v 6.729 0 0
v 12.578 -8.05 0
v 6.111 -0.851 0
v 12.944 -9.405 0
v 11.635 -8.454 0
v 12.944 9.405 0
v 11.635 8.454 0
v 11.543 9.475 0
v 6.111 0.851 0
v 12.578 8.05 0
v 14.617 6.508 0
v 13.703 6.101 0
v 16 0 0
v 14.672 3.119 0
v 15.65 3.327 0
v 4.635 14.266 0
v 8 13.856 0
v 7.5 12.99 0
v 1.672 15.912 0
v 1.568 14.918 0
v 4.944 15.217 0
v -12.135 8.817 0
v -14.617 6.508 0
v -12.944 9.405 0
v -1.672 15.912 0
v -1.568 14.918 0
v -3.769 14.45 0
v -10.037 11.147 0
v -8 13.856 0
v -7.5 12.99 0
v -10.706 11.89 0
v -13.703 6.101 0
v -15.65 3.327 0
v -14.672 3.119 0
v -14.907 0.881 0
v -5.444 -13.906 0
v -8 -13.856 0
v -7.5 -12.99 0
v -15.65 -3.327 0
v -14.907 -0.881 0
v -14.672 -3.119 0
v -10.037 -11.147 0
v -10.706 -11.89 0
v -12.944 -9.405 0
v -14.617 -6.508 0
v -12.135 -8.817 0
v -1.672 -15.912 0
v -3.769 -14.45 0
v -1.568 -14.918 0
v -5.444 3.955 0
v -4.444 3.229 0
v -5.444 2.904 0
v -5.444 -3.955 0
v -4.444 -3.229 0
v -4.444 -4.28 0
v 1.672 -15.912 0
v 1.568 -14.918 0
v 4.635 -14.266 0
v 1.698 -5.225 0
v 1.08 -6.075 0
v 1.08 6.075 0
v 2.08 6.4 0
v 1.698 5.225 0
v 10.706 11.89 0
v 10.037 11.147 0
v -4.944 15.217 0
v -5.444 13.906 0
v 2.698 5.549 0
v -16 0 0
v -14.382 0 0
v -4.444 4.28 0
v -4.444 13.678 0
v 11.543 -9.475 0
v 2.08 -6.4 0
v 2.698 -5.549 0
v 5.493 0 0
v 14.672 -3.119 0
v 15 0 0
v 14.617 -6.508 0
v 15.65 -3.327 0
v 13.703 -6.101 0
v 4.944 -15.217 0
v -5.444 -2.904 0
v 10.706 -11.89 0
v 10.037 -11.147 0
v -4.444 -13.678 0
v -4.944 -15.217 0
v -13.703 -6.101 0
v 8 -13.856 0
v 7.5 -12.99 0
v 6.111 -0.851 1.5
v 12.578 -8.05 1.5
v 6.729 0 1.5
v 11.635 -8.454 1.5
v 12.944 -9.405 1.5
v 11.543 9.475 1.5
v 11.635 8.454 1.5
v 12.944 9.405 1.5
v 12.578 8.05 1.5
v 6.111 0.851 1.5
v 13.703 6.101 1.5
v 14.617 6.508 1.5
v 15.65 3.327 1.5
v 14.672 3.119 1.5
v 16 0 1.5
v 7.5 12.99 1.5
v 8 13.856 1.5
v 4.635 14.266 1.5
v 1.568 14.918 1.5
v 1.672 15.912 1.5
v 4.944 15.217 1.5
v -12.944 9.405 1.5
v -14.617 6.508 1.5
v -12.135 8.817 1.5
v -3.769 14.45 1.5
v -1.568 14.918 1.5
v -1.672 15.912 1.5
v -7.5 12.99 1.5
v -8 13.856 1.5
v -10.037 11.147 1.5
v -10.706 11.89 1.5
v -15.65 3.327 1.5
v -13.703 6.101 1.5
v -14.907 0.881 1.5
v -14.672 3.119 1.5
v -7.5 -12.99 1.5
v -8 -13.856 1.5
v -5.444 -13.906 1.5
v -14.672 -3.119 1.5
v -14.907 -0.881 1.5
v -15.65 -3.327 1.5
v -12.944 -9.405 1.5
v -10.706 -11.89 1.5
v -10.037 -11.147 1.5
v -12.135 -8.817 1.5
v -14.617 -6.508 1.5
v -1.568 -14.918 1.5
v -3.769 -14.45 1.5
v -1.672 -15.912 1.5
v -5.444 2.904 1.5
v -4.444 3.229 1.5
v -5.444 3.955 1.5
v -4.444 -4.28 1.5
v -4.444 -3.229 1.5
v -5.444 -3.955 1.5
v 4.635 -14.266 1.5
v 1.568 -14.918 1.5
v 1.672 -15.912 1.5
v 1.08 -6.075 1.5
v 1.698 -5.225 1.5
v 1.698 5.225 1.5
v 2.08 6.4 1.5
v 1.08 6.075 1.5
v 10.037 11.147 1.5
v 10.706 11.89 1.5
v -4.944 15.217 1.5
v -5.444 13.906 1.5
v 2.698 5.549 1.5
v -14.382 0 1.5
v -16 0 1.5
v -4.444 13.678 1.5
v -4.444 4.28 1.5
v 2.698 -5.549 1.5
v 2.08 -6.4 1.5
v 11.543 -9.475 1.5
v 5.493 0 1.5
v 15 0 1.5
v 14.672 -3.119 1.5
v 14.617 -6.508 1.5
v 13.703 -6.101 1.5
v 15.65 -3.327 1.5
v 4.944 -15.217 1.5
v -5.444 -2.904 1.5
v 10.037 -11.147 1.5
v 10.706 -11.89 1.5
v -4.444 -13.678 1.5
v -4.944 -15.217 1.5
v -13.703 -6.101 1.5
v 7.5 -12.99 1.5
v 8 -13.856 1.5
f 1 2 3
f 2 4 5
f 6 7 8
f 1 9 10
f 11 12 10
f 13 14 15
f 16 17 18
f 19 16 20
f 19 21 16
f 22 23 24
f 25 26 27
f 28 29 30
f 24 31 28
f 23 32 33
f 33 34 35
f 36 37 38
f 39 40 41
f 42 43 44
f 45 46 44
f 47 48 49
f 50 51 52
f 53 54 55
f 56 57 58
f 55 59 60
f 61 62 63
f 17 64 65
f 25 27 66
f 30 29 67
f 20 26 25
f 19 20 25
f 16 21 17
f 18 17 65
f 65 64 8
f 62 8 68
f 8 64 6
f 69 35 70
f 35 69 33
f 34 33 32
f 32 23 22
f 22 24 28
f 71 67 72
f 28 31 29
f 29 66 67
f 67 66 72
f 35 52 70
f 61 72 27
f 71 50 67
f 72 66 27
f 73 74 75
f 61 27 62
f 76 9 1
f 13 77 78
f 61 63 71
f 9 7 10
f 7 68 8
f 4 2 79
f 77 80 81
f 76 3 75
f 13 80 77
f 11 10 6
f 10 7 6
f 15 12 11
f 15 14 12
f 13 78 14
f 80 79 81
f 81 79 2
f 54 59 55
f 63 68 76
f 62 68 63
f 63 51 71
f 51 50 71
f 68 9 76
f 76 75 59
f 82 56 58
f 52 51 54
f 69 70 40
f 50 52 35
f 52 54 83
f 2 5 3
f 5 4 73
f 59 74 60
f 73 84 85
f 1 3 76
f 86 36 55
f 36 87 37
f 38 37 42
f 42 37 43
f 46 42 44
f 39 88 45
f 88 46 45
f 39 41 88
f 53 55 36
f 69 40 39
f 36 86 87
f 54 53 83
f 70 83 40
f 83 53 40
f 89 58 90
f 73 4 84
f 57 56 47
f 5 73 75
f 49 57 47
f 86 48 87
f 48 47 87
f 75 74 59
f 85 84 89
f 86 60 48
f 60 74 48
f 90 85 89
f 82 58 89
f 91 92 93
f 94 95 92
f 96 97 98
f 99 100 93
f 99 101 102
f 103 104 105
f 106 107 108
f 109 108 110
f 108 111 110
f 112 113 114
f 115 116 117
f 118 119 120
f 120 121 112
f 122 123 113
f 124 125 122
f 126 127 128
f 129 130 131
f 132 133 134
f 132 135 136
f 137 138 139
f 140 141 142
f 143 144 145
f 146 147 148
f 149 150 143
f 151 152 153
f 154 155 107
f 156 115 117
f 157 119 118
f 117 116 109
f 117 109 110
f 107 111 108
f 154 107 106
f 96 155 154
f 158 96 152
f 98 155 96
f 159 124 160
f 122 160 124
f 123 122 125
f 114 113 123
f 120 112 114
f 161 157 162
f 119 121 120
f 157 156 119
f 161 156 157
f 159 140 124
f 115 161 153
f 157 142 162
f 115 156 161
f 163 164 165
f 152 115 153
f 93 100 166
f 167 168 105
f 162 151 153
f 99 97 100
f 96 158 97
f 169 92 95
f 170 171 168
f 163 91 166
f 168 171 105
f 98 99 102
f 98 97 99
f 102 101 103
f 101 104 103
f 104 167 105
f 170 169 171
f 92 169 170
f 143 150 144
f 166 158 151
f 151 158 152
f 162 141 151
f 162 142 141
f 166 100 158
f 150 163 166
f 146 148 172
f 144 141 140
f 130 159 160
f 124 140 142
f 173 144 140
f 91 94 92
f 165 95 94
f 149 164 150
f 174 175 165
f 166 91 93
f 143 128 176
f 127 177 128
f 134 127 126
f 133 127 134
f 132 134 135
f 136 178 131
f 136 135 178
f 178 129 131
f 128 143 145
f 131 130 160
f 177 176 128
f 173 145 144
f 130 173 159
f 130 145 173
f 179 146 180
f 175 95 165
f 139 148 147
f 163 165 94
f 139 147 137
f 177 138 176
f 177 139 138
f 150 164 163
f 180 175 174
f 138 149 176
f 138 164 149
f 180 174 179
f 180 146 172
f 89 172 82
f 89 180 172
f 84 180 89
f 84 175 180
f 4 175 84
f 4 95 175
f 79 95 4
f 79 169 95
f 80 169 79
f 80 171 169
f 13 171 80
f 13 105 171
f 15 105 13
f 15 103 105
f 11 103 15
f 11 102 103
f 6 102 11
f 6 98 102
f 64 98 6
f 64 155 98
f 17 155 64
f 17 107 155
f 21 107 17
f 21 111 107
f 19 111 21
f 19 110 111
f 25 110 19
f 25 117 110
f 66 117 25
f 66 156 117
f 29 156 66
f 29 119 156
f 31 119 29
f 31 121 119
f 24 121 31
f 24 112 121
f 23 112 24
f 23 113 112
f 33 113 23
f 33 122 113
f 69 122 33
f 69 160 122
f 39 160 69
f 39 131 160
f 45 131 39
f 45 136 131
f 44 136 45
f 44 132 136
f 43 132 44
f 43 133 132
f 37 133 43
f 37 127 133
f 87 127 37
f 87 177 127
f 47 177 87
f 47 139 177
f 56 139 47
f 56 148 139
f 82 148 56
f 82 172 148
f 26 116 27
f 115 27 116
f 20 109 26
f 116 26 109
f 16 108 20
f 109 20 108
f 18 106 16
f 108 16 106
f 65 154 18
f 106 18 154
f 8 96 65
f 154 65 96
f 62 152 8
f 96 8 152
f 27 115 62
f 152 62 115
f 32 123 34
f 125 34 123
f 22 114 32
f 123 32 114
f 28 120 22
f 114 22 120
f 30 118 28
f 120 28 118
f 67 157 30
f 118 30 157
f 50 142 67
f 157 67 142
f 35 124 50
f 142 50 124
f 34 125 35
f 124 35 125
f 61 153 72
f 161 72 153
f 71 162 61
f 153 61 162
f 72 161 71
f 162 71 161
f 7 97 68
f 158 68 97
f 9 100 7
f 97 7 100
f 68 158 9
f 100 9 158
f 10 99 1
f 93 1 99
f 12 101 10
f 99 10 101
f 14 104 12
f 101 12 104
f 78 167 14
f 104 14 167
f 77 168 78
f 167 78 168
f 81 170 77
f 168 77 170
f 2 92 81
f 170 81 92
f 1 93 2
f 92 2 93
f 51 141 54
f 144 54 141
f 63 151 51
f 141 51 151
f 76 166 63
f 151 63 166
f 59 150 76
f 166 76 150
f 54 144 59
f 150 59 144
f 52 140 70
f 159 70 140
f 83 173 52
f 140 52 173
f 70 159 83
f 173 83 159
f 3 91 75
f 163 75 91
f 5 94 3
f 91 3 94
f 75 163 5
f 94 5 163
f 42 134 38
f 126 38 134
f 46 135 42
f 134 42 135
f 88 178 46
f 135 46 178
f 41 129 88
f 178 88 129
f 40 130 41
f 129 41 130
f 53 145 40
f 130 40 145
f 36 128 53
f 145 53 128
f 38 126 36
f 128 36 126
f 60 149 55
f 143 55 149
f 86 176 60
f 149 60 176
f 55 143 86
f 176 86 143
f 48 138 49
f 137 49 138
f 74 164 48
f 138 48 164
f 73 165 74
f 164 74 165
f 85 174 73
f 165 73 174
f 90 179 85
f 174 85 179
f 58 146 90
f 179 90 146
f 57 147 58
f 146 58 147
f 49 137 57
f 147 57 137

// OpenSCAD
module pentagram(r, w=1, d=1) {
    linear_extrude(height=d) {
        for(a=[0:+(360/5):360]) {        
            rotate([0, 0, a]) 
                translate([-r, 0, 0]) rotate([0, 0, 18]) translate([w * 0.95, -0.5 * w]) square(size=[r, w]);
            rotate([0, 0, a])
                translate([-r, 0, 0]) rotate([0, 0, -1 * 18]) translate([w * 0.95, -0.5 * w]) square(size=[r, w]);
        }
        difference() {
            circle(r=r);
            circle(r=r-w);
        }
    }
}
DIAMETER = 34;
pentagram((DIAMETER/2) - 1, 1, 1.5);
